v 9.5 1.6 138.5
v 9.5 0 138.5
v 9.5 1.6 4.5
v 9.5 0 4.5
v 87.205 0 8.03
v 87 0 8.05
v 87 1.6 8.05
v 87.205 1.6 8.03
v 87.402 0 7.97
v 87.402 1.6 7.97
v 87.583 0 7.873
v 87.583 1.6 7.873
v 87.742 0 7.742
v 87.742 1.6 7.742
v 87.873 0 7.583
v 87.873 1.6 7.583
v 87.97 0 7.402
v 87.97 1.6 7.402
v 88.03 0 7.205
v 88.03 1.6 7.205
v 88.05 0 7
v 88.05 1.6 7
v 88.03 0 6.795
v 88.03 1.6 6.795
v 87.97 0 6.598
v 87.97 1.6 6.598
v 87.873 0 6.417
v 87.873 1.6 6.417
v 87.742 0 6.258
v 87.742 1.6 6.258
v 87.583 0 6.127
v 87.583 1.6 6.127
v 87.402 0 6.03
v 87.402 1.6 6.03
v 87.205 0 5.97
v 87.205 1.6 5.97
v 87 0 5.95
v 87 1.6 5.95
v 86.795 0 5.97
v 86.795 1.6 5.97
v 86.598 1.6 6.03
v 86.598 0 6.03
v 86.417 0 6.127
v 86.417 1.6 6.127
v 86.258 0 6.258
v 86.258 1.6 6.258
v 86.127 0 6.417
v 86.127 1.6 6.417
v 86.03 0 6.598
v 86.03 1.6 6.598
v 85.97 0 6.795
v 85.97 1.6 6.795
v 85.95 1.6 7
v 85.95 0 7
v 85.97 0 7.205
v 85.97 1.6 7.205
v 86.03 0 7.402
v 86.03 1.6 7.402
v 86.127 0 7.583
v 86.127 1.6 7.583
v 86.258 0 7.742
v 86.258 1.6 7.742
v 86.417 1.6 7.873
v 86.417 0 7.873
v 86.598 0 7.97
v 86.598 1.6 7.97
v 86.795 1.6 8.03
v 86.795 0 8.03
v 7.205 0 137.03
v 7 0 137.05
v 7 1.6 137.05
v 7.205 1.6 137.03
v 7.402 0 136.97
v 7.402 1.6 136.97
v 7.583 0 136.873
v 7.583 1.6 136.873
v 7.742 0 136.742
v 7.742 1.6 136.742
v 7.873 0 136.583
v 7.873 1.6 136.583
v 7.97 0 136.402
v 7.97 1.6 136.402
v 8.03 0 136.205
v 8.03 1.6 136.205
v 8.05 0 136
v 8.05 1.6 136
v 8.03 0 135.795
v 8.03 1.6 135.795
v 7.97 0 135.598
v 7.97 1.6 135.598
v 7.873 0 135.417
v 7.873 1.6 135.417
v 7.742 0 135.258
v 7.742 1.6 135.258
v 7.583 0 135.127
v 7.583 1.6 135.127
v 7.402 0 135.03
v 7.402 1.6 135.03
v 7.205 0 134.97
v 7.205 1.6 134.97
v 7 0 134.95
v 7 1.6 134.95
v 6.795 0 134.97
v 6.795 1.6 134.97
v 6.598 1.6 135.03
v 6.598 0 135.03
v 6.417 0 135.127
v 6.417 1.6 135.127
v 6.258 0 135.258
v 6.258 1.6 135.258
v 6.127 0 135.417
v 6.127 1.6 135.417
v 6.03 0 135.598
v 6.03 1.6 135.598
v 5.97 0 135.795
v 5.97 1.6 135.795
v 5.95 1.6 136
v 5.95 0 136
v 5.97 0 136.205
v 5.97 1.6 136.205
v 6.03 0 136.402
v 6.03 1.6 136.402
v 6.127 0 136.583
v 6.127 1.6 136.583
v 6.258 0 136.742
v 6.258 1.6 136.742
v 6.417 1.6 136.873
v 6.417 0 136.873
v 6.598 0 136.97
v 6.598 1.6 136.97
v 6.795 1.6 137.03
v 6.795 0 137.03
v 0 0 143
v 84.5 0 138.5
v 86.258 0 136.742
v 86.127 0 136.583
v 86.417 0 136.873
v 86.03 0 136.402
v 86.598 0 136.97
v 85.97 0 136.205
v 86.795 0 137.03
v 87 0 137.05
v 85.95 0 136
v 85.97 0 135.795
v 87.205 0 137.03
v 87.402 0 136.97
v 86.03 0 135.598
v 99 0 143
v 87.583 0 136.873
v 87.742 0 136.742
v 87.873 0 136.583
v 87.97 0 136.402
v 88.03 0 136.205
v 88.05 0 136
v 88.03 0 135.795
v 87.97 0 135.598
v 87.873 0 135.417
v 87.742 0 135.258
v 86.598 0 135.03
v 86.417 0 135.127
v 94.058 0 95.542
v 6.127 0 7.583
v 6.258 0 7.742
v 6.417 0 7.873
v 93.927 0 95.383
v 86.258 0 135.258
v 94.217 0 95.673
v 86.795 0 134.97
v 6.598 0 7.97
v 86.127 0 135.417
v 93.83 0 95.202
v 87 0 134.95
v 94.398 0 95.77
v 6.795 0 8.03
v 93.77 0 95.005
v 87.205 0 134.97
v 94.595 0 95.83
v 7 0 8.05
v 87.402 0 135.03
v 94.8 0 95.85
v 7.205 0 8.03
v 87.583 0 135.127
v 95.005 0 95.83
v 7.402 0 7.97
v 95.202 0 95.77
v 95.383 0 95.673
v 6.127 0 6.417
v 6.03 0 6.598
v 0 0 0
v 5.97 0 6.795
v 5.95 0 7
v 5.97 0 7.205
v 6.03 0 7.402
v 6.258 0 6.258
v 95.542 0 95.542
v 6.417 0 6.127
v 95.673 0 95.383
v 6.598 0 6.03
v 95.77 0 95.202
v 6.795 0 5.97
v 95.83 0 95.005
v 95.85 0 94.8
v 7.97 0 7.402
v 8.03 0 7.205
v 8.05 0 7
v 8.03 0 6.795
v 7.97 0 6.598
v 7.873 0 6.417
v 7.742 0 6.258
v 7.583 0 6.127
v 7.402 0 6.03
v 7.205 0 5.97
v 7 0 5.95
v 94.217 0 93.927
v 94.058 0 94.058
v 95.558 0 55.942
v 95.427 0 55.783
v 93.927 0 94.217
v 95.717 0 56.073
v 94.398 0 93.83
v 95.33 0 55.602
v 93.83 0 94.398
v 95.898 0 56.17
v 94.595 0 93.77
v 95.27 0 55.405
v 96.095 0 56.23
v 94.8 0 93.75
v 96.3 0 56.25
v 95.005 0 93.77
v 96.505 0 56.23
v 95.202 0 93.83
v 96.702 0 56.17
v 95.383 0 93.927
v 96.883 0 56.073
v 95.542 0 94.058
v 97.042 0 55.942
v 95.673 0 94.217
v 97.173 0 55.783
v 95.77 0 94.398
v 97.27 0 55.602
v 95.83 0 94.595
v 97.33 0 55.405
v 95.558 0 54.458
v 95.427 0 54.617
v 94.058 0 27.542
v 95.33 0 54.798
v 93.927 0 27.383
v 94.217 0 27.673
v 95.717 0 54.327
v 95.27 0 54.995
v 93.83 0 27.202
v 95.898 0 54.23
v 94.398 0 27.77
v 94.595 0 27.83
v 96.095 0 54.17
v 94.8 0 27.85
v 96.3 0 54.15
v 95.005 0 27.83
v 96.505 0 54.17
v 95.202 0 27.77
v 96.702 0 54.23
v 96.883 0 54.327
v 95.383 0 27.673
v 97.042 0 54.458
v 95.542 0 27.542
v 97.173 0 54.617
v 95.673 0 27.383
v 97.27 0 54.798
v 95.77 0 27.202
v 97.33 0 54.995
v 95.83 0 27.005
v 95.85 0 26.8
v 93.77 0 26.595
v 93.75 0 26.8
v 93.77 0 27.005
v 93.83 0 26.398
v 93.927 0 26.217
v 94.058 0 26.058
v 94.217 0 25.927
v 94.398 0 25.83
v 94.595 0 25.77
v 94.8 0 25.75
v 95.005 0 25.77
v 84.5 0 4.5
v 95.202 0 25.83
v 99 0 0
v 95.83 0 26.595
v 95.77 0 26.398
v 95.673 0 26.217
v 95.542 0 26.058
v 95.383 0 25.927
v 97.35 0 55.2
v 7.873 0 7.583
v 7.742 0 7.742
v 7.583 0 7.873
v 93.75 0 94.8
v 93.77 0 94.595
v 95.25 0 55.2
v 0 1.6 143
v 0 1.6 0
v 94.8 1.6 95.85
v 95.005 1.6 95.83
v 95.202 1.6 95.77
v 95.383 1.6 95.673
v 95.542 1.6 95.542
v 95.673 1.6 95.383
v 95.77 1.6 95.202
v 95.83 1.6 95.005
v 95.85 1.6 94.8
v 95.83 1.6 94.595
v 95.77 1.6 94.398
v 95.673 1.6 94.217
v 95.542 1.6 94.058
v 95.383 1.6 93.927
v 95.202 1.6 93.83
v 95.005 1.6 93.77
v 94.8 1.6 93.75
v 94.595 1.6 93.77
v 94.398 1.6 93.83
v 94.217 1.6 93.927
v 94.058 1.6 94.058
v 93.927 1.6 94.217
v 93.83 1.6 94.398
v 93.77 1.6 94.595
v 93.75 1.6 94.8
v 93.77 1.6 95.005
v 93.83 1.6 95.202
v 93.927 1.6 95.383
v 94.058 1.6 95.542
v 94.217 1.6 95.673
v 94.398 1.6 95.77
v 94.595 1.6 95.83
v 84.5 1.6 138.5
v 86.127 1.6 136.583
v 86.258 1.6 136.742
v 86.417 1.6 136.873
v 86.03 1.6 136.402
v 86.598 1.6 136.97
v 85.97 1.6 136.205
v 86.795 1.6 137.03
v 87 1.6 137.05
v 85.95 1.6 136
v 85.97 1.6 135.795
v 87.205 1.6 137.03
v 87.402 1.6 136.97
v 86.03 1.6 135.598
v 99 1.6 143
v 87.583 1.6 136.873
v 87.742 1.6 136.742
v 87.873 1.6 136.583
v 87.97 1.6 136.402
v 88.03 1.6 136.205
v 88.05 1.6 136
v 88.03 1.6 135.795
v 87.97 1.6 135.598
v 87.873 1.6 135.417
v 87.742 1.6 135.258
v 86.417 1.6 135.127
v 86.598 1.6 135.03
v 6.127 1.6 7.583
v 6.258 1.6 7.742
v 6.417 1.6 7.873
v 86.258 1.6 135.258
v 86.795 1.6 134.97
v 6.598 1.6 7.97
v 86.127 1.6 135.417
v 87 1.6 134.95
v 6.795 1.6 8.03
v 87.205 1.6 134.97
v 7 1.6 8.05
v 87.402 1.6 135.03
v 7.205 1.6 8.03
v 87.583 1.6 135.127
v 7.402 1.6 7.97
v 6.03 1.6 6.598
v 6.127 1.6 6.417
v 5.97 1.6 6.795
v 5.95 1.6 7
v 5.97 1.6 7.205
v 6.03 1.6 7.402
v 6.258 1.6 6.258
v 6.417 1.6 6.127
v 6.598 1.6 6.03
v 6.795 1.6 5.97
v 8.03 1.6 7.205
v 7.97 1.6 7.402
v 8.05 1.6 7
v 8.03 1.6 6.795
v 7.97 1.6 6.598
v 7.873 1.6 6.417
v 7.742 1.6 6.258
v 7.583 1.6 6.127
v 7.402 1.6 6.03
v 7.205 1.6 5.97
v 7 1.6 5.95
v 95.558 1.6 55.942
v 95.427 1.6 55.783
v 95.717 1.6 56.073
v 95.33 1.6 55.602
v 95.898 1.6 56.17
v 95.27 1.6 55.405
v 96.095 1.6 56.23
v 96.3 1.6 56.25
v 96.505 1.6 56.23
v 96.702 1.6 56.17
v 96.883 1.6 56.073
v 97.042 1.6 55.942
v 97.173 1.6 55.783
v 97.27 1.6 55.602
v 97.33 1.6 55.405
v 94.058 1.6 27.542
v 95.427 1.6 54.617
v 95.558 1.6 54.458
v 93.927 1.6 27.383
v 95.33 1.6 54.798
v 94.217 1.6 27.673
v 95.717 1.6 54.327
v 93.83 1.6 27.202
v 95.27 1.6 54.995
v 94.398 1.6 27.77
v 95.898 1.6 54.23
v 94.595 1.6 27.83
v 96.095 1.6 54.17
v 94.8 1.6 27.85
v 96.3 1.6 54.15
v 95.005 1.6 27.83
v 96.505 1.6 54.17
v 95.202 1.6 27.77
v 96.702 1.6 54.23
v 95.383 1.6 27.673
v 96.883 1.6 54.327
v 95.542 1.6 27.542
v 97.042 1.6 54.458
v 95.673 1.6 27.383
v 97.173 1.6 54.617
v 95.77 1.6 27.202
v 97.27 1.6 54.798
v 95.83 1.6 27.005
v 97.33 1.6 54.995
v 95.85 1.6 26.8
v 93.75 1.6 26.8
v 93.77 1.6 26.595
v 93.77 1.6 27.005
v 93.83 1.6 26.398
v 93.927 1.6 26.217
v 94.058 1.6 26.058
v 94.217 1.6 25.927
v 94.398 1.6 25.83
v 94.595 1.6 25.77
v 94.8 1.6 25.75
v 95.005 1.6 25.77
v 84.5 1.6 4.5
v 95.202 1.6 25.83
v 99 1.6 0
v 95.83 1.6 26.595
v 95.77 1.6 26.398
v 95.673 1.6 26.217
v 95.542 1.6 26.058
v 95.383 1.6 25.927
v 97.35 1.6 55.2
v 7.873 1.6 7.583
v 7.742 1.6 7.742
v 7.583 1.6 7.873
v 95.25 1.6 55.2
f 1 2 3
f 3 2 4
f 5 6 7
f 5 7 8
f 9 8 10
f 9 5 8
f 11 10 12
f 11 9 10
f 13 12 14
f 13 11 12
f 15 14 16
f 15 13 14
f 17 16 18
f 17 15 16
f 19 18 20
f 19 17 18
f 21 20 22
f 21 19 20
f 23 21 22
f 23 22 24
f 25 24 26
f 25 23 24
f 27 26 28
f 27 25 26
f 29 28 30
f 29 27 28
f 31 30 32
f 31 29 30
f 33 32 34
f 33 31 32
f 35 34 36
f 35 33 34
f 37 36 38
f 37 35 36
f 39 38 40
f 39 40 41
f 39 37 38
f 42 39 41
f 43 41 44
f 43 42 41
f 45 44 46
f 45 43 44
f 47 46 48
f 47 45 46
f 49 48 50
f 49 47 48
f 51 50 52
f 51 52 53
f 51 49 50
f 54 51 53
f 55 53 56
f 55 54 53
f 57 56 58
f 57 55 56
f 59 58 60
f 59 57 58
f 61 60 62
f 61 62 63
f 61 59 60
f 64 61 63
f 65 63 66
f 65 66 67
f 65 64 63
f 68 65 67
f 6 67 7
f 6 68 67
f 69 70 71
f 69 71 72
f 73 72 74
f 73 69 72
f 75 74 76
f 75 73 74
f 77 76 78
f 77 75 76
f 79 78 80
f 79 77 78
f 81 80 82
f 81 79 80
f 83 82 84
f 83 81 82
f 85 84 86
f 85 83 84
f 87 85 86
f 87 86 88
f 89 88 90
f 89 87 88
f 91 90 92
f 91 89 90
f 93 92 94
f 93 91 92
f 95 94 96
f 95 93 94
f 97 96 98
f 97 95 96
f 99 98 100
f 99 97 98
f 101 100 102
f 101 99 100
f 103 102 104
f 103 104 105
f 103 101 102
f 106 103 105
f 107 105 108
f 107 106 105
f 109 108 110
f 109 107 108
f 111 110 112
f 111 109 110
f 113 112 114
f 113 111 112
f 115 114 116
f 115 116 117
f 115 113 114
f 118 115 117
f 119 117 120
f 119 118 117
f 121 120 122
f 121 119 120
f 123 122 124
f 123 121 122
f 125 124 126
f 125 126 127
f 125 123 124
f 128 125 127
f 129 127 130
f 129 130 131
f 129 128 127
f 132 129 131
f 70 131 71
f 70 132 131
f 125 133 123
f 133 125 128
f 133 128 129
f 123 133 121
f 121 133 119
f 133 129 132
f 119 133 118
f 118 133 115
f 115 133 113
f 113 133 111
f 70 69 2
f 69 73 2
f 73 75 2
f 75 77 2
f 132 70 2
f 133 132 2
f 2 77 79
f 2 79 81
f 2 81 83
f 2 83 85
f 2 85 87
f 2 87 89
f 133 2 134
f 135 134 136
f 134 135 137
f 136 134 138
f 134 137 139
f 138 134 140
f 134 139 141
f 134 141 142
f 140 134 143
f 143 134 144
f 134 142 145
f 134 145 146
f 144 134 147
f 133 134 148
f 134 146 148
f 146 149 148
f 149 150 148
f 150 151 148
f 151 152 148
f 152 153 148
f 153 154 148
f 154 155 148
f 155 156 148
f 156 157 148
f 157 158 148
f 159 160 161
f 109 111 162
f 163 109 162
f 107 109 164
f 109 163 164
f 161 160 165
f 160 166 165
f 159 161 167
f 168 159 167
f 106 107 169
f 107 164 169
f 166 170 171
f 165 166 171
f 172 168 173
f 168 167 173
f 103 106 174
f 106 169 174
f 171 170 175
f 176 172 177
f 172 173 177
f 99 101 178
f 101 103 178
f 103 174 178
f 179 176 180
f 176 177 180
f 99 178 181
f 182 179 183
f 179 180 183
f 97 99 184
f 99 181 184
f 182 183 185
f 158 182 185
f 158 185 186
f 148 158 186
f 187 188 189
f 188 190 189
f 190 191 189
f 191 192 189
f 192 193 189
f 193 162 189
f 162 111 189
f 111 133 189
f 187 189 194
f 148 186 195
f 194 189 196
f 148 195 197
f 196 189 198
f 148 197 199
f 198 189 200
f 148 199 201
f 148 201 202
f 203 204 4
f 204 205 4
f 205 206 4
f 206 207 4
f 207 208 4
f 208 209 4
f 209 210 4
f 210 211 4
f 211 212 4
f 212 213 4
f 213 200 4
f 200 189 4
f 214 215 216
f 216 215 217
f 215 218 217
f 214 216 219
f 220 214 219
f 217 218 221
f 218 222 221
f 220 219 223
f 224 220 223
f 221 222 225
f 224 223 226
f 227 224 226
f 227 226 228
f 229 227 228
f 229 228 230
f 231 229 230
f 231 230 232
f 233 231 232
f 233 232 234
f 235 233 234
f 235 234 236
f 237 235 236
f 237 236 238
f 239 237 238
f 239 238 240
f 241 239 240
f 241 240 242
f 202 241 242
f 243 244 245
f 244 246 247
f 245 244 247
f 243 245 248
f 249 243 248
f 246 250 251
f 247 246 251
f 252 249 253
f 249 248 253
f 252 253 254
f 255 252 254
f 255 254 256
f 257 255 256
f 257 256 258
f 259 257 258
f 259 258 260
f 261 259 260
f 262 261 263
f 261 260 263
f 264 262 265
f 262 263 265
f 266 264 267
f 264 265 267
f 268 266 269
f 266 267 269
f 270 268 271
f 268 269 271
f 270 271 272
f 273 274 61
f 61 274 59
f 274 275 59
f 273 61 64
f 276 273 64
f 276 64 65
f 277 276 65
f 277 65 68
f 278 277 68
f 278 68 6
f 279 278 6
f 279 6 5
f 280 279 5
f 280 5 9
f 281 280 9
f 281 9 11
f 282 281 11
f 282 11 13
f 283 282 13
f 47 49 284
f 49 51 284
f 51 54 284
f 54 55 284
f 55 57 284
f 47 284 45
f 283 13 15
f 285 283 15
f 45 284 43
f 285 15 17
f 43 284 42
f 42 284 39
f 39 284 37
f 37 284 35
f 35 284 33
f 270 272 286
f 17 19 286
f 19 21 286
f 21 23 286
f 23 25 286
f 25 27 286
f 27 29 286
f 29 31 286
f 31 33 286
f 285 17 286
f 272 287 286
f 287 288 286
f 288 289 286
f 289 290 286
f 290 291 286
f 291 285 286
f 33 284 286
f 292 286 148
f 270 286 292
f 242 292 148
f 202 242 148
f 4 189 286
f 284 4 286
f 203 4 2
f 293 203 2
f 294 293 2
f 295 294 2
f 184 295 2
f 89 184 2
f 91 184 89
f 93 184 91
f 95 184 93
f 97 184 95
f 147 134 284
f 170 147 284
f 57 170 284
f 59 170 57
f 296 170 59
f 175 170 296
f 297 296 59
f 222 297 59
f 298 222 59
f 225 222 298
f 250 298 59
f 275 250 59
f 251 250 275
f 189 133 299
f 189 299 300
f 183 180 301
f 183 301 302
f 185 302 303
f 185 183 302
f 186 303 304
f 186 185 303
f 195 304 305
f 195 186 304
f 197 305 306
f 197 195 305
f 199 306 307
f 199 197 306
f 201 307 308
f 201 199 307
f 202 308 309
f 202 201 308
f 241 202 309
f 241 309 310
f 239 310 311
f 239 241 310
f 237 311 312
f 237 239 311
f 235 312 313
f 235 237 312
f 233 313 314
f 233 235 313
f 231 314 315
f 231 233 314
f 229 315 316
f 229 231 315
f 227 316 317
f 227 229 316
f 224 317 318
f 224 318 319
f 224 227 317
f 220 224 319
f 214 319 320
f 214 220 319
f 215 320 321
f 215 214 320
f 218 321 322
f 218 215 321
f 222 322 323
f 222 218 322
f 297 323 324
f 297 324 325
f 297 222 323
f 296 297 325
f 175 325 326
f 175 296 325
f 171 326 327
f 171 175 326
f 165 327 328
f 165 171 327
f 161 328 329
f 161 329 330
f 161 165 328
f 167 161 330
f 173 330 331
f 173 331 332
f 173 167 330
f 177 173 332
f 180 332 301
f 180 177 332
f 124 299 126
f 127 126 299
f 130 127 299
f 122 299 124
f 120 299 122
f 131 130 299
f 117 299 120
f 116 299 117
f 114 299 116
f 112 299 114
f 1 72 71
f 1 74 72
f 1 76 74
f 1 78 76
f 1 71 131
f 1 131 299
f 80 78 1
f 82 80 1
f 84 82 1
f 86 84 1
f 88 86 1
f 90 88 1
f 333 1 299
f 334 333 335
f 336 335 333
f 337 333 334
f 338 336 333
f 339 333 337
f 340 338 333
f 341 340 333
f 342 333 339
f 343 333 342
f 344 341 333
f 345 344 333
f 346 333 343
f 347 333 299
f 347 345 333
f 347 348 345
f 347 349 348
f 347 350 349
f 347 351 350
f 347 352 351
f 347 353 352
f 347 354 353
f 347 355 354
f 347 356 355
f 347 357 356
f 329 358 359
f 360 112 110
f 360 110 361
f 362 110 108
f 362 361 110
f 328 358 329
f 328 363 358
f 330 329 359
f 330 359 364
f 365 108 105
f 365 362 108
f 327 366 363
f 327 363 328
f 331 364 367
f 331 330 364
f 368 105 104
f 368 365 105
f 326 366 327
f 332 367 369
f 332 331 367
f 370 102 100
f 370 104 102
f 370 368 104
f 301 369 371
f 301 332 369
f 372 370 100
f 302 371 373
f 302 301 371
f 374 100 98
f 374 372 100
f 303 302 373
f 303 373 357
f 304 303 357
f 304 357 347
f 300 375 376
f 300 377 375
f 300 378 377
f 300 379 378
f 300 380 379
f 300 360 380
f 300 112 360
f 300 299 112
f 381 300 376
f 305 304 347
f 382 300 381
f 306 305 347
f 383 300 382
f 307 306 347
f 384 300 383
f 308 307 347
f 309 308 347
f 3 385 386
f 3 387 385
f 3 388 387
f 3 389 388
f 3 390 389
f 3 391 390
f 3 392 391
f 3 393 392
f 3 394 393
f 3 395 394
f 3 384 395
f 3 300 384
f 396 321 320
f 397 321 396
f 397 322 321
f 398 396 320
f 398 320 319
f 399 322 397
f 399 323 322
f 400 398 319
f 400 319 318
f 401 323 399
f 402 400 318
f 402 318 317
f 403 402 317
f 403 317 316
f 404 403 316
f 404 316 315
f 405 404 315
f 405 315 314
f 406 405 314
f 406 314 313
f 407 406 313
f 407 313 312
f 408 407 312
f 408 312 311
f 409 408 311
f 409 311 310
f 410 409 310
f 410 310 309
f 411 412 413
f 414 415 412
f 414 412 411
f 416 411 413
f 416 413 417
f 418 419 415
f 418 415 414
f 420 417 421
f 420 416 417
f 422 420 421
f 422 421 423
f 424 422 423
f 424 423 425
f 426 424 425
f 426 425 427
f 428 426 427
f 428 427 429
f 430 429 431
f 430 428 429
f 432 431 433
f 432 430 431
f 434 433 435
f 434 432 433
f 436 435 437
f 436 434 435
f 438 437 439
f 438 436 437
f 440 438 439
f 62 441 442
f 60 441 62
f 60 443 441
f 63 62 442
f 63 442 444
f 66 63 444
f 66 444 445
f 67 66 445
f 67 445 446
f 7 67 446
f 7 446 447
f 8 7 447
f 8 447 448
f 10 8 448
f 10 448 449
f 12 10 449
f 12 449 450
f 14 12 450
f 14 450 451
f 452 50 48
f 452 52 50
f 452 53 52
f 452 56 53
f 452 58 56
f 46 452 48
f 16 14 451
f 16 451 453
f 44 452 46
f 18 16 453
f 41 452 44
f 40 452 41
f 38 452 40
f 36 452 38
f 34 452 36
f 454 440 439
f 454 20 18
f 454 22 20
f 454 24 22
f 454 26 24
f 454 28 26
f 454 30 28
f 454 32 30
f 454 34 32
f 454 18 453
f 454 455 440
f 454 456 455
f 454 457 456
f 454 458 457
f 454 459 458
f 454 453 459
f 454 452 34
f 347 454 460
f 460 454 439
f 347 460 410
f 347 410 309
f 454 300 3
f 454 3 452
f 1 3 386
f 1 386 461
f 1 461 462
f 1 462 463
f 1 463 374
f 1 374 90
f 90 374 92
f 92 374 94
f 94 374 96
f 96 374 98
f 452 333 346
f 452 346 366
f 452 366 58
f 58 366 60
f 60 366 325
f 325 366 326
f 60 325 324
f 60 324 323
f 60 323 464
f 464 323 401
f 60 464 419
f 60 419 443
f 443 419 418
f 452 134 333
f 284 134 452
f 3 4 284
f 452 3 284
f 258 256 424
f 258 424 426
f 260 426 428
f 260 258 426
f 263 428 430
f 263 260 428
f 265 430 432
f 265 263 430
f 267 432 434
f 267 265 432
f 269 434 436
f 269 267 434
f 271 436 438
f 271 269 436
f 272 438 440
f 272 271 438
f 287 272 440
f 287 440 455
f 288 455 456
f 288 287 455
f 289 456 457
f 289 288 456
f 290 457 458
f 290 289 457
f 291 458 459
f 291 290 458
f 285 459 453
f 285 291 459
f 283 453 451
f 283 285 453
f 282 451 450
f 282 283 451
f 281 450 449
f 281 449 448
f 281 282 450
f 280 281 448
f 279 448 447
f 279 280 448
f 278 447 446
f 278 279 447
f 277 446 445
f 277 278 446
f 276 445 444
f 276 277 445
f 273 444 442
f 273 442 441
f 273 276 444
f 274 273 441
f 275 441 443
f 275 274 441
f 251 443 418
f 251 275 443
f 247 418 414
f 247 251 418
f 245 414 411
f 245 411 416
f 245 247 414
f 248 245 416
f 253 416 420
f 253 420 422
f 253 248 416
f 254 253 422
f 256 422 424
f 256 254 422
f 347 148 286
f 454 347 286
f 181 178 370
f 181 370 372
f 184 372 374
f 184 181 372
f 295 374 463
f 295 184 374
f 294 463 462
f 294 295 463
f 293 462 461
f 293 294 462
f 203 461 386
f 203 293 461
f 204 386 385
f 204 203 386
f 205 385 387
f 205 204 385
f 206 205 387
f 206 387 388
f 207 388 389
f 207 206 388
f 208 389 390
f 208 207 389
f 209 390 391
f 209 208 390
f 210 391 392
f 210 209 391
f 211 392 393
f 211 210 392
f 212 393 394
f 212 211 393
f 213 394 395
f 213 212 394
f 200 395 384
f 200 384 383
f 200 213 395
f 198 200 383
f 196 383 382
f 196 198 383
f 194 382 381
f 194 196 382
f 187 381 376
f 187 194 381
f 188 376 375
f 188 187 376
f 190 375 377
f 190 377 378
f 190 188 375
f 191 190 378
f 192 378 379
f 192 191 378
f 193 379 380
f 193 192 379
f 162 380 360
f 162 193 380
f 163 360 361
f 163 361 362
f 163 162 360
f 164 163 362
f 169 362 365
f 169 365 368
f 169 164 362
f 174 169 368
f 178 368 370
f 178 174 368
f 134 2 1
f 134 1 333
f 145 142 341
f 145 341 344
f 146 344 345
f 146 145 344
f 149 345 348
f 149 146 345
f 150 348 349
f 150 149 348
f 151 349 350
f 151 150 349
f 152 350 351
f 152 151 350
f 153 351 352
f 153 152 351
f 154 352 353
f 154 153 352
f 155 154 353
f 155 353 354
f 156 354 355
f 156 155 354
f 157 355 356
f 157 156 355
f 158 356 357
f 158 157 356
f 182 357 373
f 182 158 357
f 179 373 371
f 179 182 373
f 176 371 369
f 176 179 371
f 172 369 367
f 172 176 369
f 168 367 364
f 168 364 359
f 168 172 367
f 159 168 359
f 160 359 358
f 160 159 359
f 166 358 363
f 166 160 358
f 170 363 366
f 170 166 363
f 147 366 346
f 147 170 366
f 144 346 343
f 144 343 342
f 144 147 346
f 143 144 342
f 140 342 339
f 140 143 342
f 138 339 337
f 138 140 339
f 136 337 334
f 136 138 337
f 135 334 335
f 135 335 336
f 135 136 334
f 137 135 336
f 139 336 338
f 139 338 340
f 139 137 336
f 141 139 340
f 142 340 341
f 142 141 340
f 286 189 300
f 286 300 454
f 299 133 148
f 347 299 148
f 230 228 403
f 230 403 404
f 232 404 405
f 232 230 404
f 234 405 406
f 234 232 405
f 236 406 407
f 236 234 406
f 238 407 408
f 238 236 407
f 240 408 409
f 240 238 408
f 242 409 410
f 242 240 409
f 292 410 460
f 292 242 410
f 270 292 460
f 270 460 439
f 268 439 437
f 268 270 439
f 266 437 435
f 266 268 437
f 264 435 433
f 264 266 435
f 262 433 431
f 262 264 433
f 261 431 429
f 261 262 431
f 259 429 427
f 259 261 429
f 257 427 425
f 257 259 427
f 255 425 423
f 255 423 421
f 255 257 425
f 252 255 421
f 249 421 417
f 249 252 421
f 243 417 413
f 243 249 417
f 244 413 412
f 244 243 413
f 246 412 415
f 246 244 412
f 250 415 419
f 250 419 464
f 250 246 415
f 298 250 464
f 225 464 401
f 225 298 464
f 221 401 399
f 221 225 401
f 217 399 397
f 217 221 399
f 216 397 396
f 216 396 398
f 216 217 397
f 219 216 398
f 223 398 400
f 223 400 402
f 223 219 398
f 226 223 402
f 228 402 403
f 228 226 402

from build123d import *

# Parameters (mm, degrees)
SKETCH_1_W      = 99
SKETCH_1_H      = 143
SKETCH_1_W_2    = 75
SKETCH_1_H_2    = 134
SKETCH_1_R      = 1.05
EXTRUDE_1_DEPTH = 1.6


with BuildPart() as part:
    # 草图1 → 凸台-拉伸1 (new body)
    with BuildSketch(Plane(origin=(0, 0, 0), x_dir=(1, 0, 0), z_dir=(0, 1, 0))):
        with Locations((49.5, -71.5)):
            Rectangle(SKETCH_1_W, SKETCH_1_H)
        with Locations((47, -71.5)):
            Rectangle(SKETCH_1_W_2, SKETCH_1_H_2, mode=Mode.SUBTRACT)
        with Locations(Location((94.8, -94.8, 0), (0, 0, 270))):
            Circle(SKETCH_1_R, mode=Mode.SUBTRACT)
        with Locations(Location((7, -7, 0), (0, 0, 270))):
            Circle(SKETCH_1_R, mode=Mode.SUBTRACT)
        with Locations(Location((96.3, -55.2, 0), (0, 0, 270))):
            Circle(SKETCH_1_R, mode=Mode.SUBTRACT)
        with Locations(Location((94.8, -26.8, 0), (0, 0, 270))):
            Circle(SKETCH_1_R, mode=Mode.SUBTRACT)
        with Locations(Location((87, -7, 0), (0, 0, 270))):
            Circle(SKETCH_1_R, mode=Mode.SUBTRACT)
        with Locations(Location((7, -136, 0), (0, 0, 270))):
            Circle(SKETCH_1_R, mode=Mode.SUBTRACT)
        with Locations(Location((87, -136, 0), (0, 0, 270))):
            Circle(SKETCH_1_R, mode=Mode.SUBTRACT)
    extrude(amount=EXTRUDE_1_DEPTH)


solid = part.part
